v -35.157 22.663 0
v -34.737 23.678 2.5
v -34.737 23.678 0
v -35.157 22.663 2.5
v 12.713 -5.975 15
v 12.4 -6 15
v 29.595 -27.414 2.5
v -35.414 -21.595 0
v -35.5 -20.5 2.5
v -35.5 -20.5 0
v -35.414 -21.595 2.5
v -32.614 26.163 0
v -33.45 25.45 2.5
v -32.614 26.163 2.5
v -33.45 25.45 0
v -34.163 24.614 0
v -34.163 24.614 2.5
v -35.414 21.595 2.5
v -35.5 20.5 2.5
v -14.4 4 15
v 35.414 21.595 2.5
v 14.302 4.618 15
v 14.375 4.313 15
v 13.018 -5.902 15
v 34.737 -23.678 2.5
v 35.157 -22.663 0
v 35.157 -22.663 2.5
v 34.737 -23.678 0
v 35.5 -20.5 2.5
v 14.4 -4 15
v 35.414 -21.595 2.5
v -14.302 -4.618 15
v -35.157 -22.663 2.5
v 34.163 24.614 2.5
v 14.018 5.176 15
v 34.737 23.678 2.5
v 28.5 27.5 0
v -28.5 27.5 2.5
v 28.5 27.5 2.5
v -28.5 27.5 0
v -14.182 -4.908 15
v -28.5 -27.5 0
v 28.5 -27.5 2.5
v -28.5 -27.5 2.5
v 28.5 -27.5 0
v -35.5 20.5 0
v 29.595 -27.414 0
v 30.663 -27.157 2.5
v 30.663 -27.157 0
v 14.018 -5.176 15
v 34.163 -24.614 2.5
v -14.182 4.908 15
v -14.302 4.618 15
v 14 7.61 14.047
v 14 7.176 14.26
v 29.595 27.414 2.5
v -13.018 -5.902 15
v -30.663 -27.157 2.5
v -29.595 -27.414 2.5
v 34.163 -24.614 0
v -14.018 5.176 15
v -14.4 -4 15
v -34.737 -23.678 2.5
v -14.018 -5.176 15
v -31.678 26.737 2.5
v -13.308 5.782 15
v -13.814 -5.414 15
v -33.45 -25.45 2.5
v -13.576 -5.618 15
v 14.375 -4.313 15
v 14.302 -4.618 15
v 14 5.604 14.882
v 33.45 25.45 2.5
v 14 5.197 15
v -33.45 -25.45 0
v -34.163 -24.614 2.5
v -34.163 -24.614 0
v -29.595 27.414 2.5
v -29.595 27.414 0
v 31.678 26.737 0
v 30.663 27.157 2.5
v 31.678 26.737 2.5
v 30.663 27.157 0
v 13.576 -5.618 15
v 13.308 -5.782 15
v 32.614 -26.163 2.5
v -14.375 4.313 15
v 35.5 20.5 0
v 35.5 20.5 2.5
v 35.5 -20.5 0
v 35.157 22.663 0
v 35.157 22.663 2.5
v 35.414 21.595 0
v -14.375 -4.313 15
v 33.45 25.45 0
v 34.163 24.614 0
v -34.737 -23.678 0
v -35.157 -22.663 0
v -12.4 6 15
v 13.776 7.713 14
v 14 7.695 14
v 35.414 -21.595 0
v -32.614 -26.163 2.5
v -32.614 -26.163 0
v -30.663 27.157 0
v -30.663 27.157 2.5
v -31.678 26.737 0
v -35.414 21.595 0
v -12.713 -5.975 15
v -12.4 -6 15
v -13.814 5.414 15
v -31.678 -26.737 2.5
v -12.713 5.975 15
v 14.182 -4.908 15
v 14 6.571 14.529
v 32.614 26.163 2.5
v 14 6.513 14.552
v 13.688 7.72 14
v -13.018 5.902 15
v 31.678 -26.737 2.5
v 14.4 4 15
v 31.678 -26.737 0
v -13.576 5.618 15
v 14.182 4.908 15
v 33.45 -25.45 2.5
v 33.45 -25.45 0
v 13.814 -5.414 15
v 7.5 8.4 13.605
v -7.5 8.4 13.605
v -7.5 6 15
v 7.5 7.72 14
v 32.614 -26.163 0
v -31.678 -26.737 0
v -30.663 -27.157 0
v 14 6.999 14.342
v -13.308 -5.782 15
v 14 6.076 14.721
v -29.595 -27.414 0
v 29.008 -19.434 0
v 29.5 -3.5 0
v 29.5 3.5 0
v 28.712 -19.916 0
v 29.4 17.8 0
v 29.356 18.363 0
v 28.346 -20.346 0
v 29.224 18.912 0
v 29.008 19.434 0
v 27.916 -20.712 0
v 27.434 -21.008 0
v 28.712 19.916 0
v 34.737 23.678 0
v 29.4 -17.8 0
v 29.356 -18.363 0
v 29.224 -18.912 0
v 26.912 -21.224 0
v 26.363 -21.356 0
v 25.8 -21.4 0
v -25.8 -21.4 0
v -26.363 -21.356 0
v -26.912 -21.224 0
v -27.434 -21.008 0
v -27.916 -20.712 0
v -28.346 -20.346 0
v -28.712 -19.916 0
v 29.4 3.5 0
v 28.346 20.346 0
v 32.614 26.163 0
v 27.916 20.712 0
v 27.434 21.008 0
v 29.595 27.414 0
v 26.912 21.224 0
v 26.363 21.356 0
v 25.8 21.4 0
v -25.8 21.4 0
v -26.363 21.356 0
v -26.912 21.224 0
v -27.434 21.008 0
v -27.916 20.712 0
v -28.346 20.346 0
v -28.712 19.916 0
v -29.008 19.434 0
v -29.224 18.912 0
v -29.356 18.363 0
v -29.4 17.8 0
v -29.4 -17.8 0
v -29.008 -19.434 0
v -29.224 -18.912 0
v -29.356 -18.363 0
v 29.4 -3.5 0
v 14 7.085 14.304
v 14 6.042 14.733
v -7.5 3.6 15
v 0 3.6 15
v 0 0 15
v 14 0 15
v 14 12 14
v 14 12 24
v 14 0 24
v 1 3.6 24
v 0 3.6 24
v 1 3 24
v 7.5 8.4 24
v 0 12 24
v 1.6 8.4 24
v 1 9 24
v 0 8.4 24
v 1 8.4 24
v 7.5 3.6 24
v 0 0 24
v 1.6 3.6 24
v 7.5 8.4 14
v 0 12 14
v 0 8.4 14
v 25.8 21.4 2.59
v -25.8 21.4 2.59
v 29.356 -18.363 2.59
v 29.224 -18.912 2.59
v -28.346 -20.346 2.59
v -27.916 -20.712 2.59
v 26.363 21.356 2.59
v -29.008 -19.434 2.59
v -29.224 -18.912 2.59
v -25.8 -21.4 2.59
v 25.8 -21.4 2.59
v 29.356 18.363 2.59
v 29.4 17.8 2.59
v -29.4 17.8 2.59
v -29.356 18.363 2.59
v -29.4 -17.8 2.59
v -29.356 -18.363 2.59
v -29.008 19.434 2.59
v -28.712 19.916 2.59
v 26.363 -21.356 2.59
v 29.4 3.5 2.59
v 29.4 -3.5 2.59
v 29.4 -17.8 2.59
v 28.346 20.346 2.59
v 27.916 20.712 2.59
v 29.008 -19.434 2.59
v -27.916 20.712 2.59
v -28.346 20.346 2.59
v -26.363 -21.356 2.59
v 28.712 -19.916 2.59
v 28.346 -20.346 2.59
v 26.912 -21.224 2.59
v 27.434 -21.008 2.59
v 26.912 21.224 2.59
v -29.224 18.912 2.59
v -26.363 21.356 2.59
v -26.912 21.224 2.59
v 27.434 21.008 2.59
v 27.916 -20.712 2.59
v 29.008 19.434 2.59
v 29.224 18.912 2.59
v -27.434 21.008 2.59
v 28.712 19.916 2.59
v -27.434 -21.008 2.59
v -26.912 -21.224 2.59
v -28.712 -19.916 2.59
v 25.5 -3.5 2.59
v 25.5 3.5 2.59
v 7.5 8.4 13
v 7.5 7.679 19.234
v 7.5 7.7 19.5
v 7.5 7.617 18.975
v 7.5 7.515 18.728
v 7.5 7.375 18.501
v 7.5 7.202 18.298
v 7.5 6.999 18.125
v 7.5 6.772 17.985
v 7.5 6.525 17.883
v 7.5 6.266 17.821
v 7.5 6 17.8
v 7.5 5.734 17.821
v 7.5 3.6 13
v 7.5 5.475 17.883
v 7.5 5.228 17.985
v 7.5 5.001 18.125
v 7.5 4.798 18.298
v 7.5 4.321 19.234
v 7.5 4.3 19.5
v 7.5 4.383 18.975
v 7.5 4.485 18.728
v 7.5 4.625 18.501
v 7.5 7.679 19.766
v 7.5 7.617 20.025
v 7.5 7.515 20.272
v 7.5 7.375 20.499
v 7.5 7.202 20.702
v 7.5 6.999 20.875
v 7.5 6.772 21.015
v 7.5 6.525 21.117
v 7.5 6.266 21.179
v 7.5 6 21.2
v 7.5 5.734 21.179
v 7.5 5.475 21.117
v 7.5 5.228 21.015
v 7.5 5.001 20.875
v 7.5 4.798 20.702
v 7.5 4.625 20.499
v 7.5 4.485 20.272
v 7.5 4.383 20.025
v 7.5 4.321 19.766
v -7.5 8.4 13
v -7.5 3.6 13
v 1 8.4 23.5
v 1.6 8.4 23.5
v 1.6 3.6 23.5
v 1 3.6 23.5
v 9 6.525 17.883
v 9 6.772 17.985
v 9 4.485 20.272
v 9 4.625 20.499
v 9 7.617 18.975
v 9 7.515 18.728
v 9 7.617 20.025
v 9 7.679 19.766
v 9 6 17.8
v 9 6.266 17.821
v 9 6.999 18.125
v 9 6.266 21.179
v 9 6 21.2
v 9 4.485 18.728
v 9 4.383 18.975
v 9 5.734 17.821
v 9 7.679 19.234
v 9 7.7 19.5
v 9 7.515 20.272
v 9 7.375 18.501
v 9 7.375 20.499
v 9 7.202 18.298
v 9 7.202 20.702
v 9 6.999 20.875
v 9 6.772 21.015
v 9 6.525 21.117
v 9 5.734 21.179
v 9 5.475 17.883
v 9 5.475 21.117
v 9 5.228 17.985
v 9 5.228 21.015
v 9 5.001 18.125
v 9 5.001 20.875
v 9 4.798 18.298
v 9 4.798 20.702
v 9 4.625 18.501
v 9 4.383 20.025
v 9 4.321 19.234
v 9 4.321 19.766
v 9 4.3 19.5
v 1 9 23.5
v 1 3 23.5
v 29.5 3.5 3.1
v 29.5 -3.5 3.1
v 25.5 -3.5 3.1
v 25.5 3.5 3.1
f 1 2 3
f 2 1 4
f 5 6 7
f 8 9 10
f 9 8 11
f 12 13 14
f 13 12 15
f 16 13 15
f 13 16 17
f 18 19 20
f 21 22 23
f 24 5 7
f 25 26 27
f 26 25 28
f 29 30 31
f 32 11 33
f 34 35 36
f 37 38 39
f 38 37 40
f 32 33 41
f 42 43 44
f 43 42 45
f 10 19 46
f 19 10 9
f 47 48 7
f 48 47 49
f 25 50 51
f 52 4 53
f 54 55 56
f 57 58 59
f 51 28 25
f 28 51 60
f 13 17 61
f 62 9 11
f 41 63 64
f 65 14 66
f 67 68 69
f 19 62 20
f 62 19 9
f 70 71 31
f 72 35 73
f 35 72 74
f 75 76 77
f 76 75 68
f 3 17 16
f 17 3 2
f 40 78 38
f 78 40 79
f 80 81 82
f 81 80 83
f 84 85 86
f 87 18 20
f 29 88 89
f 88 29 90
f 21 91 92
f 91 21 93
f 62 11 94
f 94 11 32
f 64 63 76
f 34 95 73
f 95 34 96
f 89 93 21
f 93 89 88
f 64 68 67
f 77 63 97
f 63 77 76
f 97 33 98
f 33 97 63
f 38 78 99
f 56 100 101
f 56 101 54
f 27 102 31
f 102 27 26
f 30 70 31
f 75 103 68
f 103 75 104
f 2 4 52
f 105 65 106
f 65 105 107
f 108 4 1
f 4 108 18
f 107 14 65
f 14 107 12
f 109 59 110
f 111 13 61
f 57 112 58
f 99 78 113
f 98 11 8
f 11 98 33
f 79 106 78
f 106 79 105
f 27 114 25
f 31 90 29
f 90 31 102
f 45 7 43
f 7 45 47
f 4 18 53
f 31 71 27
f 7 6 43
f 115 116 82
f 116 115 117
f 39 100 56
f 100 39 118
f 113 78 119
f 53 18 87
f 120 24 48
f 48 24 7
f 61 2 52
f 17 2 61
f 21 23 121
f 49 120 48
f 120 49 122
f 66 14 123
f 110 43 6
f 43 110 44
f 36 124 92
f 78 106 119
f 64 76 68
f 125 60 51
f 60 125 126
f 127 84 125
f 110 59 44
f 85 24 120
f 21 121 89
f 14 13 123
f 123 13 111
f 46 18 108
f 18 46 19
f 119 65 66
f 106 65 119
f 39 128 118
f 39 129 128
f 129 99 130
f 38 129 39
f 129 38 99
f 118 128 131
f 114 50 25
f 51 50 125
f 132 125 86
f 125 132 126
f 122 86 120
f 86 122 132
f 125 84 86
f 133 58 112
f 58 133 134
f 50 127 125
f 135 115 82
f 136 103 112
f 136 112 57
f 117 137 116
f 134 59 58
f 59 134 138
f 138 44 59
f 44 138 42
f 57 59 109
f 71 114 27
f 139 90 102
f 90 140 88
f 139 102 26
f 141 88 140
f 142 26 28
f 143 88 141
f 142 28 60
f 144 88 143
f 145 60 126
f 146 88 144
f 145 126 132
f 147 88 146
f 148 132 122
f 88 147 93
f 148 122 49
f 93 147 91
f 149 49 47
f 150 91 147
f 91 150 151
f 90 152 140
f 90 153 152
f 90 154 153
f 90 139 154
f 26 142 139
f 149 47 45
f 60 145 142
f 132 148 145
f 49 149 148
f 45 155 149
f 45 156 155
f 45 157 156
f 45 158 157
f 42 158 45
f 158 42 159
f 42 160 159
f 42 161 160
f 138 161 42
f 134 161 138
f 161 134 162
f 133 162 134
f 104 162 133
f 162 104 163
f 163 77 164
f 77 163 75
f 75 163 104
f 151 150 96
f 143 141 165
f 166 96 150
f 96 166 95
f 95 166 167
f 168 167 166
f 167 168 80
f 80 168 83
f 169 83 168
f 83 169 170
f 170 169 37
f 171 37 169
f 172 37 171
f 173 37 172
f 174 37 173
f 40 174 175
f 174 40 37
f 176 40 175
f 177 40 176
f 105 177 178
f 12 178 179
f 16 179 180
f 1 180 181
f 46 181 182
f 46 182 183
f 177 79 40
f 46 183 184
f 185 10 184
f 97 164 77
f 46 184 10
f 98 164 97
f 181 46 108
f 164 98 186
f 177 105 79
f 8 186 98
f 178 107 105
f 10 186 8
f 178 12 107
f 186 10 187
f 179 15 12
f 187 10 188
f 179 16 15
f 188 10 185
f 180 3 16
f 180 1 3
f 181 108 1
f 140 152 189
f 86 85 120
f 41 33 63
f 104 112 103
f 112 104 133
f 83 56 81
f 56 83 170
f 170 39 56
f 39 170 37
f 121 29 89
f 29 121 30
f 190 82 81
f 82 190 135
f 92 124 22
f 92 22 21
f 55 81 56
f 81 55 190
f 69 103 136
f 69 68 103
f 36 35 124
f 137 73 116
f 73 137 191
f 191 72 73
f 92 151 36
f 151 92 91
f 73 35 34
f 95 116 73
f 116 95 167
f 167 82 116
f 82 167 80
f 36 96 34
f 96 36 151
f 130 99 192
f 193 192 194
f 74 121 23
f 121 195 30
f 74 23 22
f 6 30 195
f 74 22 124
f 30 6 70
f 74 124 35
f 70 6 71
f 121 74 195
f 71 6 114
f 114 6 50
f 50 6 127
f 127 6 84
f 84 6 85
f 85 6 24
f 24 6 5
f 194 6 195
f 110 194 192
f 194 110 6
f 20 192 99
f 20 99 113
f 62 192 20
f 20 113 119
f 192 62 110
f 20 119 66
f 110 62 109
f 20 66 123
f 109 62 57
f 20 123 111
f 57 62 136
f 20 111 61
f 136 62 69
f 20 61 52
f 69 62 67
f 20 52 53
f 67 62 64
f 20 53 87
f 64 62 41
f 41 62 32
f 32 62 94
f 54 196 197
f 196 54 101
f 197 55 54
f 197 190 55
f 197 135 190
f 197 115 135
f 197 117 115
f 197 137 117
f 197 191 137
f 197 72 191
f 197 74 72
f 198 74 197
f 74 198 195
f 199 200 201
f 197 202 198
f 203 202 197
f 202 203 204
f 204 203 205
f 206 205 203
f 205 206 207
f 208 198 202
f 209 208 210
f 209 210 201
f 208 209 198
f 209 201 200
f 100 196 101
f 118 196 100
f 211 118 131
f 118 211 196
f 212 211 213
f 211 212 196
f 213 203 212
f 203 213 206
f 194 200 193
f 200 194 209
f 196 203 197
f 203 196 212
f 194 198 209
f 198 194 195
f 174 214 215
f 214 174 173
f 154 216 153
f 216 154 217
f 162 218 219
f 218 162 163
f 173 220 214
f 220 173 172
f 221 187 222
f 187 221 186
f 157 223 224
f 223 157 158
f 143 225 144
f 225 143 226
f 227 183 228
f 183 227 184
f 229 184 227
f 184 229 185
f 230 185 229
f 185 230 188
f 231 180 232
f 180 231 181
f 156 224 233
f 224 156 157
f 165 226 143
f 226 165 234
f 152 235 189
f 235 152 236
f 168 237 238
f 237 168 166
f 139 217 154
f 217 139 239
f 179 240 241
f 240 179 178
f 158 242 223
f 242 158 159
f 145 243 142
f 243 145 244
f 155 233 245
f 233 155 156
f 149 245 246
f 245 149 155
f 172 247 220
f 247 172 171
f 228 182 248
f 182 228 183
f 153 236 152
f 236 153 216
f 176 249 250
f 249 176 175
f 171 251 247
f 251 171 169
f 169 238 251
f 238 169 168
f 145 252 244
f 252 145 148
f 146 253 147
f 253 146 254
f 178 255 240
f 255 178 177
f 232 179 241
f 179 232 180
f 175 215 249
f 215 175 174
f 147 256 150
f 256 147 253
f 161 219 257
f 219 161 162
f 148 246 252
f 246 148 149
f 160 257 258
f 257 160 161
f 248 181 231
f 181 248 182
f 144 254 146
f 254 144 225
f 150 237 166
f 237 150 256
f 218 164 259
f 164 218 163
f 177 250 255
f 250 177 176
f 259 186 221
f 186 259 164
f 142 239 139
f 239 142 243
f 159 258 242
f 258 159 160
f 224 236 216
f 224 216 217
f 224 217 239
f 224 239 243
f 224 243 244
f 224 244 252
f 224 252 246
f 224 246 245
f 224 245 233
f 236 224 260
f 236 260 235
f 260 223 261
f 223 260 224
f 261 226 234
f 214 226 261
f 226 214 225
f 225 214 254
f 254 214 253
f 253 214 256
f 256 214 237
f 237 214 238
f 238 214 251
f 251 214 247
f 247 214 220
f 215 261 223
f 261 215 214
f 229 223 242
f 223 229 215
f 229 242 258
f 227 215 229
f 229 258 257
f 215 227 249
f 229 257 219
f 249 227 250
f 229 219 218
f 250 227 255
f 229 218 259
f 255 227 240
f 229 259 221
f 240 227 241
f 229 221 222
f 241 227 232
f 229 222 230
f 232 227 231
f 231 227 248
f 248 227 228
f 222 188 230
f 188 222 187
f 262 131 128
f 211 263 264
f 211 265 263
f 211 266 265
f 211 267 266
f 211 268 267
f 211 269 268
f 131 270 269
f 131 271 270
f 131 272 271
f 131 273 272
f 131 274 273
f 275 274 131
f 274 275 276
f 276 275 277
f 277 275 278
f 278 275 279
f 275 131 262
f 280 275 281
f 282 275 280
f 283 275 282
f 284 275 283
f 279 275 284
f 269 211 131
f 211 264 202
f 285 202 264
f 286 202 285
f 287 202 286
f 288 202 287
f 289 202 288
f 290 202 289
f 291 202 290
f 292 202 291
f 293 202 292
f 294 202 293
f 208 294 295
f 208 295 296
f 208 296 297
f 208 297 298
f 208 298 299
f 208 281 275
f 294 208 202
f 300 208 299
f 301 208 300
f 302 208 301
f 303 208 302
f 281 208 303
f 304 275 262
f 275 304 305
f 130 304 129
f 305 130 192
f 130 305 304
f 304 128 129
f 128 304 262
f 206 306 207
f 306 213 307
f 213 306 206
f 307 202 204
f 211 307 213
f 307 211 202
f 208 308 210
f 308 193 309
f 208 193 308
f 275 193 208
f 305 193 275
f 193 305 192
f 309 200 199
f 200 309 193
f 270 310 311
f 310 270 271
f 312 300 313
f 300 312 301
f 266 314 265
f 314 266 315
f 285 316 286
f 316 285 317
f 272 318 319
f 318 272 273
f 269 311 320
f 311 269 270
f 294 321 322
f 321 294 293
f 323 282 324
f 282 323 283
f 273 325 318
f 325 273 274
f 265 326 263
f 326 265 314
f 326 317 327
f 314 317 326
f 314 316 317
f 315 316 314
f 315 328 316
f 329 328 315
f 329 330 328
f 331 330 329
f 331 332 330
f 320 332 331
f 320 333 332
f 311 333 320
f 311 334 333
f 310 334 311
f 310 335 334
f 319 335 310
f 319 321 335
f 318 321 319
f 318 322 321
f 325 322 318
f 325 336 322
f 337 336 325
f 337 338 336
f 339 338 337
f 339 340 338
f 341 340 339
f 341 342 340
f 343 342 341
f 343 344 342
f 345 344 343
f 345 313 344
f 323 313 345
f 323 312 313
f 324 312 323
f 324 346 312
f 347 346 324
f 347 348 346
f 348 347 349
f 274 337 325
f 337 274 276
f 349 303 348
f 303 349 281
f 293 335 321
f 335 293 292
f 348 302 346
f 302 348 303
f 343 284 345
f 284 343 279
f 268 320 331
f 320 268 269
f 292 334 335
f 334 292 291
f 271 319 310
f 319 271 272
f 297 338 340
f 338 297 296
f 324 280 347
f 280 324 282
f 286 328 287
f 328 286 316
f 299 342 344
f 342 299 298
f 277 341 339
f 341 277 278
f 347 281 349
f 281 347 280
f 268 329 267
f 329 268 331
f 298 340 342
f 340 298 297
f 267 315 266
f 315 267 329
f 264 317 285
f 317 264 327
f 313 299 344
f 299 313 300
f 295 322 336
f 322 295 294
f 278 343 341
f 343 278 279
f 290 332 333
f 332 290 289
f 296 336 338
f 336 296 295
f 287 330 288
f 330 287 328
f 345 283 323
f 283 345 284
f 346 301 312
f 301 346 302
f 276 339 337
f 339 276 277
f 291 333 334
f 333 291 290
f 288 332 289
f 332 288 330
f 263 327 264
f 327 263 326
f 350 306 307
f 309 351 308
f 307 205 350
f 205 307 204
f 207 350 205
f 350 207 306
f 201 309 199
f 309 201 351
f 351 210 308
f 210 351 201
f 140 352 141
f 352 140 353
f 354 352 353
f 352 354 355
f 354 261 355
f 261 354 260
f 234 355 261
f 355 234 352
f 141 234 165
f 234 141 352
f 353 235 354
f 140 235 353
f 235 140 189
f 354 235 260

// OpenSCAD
// ====================================================================
// [PRINT 02] Alpine Gondola Roof with Clevis Bracket
// Sits 100% flat on its bottom rim at Z = 0.
// Keyway is recessed upwards into the roof cavity (no negative Z!).
// Includes captive M3 nut pocket and alignment direction arrow.
// ZERO SUPPORTS NEEDED!
// ====================================================================

use <gondola_cabin.scad>;

$fn = 50;

// Centered on bed at Z = 0
cabin_roof();
